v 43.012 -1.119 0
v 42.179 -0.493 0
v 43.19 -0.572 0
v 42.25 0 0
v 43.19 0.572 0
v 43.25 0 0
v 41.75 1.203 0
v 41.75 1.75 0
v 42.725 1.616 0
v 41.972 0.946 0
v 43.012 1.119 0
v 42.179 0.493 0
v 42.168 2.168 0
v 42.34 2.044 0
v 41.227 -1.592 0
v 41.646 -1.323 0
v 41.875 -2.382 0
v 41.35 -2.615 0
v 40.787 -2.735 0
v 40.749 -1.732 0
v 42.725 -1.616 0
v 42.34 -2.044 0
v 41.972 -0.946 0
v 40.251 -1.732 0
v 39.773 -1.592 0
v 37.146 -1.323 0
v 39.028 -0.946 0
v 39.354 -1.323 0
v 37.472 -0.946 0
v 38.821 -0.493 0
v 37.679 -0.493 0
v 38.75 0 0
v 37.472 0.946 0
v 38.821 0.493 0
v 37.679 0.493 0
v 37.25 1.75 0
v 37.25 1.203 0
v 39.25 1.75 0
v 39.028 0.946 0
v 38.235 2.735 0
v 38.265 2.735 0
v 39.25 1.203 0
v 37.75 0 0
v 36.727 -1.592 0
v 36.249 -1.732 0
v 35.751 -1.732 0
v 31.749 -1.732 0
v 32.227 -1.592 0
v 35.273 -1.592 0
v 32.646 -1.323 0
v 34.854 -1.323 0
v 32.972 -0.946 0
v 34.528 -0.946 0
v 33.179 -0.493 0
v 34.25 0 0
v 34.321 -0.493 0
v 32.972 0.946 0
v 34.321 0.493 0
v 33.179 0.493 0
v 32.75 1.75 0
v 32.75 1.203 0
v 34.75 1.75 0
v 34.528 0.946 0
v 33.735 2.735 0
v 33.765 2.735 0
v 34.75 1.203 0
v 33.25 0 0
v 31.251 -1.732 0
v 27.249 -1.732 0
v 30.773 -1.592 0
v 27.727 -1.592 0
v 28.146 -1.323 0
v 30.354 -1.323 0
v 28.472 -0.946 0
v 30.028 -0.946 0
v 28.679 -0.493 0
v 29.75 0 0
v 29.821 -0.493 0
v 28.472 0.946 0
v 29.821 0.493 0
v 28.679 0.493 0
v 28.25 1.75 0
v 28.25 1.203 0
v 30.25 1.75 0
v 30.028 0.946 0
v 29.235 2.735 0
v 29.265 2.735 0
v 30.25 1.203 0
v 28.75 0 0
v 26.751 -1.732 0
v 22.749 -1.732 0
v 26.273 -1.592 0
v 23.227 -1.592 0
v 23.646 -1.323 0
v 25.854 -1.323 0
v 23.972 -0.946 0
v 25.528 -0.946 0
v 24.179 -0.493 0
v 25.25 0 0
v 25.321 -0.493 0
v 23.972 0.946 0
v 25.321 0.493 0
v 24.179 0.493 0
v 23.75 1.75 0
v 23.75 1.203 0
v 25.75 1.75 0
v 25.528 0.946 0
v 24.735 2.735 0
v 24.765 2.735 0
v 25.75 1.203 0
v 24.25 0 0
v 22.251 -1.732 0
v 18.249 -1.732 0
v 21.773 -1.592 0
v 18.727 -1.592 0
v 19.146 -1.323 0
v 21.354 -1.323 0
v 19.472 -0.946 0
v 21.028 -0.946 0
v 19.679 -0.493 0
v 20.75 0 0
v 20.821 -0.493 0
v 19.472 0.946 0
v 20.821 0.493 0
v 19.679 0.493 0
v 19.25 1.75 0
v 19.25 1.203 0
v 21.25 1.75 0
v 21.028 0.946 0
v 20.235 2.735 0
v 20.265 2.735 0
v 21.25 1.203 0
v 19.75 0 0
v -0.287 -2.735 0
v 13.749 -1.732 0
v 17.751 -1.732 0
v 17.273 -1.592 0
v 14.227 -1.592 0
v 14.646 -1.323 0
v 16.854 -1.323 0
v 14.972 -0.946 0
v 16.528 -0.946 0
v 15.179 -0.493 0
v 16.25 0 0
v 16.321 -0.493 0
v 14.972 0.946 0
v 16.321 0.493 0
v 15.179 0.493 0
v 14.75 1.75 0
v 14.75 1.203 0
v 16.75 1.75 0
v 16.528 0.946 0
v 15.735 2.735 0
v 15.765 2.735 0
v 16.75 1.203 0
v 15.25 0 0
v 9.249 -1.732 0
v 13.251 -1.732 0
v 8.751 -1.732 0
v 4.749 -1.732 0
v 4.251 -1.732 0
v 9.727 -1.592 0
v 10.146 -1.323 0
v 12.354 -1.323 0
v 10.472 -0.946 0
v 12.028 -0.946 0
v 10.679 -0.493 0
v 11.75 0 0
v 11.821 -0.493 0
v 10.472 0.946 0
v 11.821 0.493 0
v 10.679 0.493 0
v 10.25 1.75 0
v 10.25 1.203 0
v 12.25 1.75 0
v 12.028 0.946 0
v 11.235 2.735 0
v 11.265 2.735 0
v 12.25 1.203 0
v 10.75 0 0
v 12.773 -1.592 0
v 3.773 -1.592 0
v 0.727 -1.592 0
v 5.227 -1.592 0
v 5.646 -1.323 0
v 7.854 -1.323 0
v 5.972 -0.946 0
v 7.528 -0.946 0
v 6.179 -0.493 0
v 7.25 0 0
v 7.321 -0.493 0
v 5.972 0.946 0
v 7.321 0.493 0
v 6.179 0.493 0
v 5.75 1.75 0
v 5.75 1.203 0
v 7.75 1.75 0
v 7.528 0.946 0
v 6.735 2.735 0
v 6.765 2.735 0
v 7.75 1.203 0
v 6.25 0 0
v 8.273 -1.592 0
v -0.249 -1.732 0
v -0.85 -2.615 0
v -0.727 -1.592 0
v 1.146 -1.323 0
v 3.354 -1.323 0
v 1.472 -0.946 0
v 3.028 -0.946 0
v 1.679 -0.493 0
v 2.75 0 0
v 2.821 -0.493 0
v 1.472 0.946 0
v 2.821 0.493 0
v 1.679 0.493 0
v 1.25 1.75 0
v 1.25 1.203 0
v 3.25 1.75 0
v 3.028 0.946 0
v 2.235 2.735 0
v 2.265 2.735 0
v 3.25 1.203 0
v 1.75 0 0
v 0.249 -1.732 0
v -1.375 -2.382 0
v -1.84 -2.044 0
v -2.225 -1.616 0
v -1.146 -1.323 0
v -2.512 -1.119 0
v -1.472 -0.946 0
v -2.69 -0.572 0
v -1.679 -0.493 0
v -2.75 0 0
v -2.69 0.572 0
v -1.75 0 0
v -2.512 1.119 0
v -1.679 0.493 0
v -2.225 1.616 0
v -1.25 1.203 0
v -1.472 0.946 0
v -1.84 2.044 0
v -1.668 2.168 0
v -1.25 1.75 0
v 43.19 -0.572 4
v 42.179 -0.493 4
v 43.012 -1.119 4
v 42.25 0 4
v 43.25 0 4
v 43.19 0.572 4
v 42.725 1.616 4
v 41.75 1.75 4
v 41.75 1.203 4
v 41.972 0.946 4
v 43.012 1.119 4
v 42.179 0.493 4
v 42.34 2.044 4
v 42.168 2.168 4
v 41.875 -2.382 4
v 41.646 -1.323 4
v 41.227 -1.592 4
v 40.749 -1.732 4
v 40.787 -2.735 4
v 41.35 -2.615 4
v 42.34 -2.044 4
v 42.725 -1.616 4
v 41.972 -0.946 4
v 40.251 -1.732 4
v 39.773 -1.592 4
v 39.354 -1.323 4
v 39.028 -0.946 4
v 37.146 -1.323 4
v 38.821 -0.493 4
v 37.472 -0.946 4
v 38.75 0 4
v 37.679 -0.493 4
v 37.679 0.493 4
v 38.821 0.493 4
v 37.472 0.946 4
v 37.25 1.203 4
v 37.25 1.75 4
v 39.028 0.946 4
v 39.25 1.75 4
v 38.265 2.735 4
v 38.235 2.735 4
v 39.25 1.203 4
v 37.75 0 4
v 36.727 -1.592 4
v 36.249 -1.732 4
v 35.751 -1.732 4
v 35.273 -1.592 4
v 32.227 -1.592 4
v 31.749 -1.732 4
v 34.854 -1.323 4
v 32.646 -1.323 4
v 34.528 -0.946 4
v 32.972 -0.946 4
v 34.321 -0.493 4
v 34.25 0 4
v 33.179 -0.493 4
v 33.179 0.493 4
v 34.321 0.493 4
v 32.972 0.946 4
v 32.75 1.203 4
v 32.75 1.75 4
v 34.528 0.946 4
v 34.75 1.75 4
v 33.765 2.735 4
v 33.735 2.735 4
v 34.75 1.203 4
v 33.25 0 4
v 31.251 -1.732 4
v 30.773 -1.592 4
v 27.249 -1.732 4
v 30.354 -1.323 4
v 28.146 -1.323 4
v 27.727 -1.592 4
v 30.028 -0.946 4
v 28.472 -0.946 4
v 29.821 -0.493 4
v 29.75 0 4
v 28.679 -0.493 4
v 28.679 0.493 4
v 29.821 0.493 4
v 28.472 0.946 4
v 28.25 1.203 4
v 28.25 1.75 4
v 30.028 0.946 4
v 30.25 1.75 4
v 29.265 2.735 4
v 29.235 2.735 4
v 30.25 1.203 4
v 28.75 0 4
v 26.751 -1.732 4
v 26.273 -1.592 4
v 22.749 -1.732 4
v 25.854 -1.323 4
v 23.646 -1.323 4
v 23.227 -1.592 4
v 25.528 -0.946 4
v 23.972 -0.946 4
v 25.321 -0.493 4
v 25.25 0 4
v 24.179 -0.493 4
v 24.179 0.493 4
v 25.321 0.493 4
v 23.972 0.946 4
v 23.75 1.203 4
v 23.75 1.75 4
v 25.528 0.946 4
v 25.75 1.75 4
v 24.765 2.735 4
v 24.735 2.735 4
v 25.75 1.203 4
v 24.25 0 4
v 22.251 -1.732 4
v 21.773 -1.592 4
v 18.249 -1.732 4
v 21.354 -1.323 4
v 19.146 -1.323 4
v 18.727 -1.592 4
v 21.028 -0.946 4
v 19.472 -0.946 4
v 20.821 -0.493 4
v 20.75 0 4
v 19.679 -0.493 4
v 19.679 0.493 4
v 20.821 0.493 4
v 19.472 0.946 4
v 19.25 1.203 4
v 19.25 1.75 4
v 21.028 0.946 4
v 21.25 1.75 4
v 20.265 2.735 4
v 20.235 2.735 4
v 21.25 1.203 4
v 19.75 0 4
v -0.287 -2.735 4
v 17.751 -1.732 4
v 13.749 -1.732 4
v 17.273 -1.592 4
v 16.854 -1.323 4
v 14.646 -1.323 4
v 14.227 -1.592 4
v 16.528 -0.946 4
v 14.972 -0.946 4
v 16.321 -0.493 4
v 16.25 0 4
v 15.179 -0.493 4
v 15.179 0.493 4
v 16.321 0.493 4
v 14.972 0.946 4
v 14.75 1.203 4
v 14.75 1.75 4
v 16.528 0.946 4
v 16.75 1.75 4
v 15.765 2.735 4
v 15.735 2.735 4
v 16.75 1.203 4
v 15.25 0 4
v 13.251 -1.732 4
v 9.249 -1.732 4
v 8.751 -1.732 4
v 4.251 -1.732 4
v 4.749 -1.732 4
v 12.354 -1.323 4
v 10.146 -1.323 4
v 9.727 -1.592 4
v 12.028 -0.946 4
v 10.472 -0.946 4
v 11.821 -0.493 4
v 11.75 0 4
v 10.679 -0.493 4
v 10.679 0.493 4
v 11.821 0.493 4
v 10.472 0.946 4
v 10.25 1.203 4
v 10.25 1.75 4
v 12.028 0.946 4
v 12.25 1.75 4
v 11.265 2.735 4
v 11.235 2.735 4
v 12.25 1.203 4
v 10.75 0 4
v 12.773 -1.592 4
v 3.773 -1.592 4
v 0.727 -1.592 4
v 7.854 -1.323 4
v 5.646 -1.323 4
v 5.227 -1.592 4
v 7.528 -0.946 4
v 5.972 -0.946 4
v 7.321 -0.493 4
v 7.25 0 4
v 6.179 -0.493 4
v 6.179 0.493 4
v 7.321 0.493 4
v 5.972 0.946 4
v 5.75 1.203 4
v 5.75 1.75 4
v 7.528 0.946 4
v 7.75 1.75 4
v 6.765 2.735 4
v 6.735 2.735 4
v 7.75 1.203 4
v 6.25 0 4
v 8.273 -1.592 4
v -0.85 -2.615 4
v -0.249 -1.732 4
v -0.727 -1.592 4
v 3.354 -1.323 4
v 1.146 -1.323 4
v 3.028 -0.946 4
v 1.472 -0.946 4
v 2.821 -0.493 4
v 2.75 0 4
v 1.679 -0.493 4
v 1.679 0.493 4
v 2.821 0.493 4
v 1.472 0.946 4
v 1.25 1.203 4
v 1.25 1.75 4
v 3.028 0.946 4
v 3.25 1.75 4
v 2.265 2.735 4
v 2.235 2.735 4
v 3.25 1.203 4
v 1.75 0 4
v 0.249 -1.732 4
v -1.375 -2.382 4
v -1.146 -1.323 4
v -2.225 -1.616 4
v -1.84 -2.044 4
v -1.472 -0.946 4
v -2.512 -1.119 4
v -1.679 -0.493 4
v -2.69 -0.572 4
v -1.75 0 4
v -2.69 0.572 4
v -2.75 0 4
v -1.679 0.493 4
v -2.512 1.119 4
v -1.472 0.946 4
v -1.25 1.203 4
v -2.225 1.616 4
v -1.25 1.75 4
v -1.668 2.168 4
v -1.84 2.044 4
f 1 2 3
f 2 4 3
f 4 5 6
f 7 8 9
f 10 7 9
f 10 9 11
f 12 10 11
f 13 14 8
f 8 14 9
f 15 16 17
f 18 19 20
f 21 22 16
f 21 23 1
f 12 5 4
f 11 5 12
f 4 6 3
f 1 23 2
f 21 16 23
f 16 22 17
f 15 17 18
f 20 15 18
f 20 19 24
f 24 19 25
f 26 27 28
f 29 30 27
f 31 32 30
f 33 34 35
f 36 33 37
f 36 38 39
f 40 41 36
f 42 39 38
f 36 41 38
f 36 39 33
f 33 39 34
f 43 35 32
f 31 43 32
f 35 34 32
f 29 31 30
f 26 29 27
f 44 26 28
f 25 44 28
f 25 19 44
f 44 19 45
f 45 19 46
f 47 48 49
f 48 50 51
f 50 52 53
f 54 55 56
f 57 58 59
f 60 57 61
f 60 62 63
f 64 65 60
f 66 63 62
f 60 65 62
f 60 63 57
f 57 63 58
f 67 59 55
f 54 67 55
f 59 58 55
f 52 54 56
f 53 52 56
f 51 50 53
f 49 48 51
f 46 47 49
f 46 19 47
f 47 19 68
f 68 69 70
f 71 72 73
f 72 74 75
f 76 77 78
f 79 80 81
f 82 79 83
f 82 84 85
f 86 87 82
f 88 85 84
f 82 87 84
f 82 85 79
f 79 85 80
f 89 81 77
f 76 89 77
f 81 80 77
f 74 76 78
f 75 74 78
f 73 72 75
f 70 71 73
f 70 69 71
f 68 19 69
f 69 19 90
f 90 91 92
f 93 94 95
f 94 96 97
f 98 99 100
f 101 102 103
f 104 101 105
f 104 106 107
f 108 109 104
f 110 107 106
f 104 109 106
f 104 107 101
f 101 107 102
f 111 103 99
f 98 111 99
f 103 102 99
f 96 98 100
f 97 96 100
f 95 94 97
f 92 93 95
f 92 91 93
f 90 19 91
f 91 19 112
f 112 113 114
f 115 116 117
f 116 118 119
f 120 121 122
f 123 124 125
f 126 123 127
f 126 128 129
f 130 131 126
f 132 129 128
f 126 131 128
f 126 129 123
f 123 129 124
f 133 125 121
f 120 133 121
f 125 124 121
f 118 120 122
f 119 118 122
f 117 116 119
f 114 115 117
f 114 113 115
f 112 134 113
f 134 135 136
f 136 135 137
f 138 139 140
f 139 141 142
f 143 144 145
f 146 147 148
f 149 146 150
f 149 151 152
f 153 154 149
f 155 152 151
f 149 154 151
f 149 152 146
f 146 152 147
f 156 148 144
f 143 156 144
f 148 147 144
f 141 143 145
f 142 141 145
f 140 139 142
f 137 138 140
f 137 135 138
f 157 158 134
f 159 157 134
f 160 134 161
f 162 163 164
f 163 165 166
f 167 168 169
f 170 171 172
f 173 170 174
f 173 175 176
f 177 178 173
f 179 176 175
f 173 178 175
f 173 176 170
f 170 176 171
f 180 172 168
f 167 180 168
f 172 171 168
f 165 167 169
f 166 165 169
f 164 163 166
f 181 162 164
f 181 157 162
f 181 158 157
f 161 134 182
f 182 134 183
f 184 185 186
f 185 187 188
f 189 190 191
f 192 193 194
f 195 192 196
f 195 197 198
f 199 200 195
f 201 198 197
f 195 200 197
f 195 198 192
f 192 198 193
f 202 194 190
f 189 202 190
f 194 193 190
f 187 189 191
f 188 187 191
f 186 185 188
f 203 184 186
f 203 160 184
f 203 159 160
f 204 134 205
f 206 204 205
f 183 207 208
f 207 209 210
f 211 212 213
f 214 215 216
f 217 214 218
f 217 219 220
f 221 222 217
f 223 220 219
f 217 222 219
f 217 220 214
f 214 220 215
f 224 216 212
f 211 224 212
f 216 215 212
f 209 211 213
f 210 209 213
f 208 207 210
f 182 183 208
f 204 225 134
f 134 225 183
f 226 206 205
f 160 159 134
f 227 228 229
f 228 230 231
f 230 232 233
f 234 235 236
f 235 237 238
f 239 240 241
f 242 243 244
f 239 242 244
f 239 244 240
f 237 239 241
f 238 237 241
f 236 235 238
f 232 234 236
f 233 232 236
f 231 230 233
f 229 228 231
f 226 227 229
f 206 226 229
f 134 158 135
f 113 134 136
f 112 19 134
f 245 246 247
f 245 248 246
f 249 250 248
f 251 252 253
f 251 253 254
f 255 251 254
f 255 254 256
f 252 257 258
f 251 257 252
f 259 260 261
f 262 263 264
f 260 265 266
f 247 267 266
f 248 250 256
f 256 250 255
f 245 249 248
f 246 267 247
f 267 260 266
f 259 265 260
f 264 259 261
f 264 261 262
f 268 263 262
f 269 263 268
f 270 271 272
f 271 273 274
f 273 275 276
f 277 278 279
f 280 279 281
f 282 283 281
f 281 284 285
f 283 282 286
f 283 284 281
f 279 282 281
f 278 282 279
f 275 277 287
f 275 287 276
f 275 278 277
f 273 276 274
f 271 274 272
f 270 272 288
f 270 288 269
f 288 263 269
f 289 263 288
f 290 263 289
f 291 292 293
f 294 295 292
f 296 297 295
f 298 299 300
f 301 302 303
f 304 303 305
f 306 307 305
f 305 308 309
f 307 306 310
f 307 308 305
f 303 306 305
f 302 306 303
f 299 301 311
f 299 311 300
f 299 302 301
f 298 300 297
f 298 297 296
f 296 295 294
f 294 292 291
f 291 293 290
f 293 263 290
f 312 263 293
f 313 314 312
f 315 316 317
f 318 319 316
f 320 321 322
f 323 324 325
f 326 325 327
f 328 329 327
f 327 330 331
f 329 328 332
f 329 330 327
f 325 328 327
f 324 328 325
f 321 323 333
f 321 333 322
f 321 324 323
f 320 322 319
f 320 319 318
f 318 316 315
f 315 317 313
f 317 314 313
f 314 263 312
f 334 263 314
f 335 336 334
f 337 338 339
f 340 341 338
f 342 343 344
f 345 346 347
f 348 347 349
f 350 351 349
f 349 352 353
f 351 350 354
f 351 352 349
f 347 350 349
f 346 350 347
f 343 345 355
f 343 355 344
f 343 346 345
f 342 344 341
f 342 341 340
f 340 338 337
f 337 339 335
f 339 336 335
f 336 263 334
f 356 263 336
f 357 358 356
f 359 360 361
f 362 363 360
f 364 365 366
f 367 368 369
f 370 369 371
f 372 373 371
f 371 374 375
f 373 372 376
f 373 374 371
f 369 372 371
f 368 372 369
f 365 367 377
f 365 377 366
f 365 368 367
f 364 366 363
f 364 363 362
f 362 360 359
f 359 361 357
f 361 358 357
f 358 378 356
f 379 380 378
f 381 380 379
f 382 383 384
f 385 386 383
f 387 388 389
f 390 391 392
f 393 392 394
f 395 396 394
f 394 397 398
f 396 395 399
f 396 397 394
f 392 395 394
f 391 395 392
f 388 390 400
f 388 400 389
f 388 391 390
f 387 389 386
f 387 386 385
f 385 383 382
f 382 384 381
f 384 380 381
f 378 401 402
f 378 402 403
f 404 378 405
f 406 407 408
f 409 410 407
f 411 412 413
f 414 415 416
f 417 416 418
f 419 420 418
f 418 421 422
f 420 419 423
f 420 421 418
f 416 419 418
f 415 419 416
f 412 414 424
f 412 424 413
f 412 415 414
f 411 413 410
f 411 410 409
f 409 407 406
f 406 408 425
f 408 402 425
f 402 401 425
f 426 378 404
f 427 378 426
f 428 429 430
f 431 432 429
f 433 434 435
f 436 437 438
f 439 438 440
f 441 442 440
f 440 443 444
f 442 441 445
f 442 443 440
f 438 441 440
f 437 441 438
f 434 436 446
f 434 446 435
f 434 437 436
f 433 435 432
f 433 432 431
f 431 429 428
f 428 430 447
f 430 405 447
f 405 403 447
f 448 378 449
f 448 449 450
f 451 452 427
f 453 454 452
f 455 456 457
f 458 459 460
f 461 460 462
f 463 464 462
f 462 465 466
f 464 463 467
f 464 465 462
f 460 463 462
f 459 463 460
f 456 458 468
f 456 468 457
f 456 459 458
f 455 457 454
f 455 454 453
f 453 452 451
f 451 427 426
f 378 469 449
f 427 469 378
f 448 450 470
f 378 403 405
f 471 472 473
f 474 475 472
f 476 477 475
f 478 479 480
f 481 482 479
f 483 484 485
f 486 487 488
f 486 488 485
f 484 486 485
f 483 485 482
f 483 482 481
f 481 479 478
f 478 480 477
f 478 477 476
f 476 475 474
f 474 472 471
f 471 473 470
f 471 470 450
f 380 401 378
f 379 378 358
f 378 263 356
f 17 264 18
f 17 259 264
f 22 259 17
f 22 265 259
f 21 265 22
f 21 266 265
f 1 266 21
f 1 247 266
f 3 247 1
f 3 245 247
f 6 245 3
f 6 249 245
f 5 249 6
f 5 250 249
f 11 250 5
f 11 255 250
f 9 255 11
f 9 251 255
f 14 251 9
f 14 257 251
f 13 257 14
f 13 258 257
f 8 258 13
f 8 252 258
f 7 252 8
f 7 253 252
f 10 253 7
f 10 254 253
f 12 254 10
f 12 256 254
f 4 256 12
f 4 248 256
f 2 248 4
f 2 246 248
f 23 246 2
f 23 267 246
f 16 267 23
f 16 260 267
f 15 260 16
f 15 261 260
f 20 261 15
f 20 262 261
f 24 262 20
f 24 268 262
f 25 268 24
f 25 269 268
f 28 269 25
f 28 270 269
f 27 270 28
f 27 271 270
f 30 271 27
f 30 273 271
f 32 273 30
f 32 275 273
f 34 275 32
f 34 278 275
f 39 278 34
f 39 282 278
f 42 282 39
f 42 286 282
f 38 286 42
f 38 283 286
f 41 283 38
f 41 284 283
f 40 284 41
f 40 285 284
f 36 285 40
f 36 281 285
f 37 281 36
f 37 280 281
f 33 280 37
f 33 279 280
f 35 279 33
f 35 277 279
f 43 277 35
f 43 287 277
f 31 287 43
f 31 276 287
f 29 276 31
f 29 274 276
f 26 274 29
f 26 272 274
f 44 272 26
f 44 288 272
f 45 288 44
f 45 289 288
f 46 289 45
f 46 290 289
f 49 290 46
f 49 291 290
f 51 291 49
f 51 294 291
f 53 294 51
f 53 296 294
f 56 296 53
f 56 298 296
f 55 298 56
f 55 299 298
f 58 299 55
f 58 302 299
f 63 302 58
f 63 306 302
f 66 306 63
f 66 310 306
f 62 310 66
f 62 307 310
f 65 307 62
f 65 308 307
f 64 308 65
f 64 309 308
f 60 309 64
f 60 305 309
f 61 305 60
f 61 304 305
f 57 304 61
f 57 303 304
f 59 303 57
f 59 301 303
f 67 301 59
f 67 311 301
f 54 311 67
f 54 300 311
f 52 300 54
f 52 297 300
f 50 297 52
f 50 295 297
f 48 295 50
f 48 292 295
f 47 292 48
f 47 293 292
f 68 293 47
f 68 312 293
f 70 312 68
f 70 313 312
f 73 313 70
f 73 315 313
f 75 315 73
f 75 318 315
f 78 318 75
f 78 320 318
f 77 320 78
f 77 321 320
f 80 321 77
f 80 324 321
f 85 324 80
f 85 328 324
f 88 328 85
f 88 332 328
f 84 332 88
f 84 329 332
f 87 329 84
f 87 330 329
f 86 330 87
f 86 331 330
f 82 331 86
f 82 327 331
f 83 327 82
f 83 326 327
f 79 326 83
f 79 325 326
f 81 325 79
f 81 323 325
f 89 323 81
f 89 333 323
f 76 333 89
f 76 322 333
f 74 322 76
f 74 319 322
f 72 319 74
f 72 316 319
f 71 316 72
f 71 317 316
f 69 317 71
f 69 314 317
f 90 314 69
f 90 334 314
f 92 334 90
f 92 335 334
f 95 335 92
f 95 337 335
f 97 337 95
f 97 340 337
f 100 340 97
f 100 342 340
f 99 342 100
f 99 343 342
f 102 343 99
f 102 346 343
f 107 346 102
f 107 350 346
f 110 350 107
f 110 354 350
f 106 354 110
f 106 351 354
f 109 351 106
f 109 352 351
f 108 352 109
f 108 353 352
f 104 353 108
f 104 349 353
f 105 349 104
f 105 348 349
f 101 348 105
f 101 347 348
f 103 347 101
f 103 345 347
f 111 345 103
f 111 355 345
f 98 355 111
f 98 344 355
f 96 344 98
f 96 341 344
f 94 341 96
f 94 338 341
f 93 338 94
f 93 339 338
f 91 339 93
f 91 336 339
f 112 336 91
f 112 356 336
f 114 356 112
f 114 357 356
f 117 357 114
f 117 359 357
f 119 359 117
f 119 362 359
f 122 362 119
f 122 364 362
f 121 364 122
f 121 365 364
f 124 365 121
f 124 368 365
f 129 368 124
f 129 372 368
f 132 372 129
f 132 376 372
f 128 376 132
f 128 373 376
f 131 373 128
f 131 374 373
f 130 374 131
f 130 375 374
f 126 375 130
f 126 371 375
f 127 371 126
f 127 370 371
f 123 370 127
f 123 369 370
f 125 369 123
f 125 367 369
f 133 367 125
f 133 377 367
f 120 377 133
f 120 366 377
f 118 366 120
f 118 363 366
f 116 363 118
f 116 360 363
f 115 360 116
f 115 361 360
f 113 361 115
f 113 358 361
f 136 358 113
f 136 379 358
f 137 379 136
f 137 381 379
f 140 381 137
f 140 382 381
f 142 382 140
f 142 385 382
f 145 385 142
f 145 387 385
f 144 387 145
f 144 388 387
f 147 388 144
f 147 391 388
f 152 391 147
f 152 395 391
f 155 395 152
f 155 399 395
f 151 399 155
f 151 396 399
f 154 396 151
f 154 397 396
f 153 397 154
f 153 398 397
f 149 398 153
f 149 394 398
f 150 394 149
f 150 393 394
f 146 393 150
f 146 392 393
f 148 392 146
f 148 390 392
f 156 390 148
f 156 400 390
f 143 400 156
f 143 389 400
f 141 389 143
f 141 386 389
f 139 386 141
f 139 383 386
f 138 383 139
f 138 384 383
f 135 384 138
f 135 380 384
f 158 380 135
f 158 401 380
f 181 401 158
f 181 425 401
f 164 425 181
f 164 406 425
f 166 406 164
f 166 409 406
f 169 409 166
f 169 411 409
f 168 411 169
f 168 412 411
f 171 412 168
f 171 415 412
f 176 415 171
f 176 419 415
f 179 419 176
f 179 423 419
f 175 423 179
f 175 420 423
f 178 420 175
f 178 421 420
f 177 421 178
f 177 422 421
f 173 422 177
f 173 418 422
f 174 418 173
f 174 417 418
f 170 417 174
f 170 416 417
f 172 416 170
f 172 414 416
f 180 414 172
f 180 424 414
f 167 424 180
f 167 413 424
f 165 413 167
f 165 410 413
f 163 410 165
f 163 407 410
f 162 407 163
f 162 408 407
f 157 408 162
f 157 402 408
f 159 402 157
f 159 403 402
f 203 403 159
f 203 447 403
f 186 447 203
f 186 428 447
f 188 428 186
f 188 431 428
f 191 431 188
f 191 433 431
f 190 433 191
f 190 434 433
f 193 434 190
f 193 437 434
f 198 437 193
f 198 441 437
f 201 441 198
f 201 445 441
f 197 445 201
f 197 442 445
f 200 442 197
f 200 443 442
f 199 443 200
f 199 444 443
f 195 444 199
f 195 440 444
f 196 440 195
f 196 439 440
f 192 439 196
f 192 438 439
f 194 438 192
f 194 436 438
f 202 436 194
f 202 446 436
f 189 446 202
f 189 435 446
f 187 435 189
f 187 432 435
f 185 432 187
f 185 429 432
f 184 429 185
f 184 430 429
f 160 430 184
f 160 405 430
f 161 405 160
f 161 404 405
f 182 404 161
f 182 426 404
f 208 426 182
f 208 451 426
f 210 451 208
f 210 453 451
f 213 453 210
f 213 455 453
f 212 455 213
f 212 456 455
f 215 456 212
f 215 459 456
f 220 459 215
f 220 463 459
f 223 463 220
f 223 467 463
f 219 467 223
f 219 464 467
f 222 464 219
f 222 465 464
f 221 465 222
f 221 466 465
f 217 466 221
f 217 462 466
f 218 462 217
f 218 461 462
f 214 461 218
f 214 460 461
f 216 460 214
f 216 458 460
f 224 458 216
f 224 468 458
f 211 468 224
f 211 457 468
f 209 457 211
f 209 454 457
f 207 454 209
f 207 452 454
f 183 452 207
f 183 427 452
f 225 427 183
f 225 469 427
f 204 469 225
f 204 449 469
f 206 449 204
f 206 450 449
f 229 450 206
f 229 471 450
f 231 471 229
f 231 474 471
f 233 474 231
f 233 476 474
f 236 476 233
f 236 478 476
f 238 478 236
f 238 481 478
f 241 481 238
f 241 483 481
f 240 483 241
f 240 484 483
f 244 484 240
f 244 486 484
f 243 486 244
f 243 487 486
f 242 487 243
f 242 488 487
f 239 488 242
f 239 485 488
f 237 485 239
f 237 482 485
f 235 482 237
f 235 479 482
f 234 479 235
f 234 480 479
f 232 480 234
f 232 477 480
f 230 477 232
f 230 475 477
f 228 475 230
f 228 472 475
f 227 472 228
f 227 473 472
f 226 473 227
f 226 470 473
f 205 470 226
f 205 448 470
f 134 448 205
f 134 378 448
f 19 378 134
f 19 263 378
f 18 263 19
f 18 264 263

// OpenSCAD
    /*customizeable cable comb*/
        /*by Marchogwyn*/
        
//Variables

//Diameter of the hole for the cable you want to hold. Add tolerancing if you want the clip to be snug or loose.
wire_size=3.5;

//Number of wires to hold.
wires=10;

//Single or double row of holes?
rows=1;//[1:single,0:double]

//tightness of the opening in the form of wire size - gap. Set to lower values to make the cables easier to get in and out of the clip
gap=1;

//spacing between the holes. Also the thickness of the spine of the clip
spacing=1;

//z-height of the clip
height=4;

/* [hidden] */
//resolution
$fs=0.5;

//Modules
module comb(slots=10){
    difference(){ 
        hull()
            for(i=[0:1])
                translate([i*(slots-1)*(wire_size+spacing),0,0])
                    circle(d=(wire_size+spacing*2));
        for(i=[0:slots-1]){
            translate([i*(wire_size+spacing),0,0]){
                circle(d=wire_size);
            
                translate([0,(wire_size/2+spacing)/2,0])
                    square([wire_size-gap,wire_size/2+spacing],center=true);
            
                translate([0,(wire_size+spacing*2)/2,0])
                rotate([0,0,45])
                    square(1.4142*(wire_size+spacing)/2,center=true);
            }
        }
    }
}

//Render

//single line of holes
if(rows){
    linear_extrude(height=height)comb(wires);
}

//double line of holes
else if((!rows)&&(wires%2==0)){//if there are an even number of holes
    linear_extrude(height=height){
        comb(wires/2);
        translate([0,-(wire_size+spacing),0])mirror([0,1,0])comb(wires/2);
    }
}
else{//if there are an odd number of holes
    linear_extrude(height=height){
        comb(ceil(wires/2));
        translate([(wire_size+spacing)/2,-(wire_size+spacing),0])
            mirror([0,1,0])comb(floor(wires/2));
    }
}
